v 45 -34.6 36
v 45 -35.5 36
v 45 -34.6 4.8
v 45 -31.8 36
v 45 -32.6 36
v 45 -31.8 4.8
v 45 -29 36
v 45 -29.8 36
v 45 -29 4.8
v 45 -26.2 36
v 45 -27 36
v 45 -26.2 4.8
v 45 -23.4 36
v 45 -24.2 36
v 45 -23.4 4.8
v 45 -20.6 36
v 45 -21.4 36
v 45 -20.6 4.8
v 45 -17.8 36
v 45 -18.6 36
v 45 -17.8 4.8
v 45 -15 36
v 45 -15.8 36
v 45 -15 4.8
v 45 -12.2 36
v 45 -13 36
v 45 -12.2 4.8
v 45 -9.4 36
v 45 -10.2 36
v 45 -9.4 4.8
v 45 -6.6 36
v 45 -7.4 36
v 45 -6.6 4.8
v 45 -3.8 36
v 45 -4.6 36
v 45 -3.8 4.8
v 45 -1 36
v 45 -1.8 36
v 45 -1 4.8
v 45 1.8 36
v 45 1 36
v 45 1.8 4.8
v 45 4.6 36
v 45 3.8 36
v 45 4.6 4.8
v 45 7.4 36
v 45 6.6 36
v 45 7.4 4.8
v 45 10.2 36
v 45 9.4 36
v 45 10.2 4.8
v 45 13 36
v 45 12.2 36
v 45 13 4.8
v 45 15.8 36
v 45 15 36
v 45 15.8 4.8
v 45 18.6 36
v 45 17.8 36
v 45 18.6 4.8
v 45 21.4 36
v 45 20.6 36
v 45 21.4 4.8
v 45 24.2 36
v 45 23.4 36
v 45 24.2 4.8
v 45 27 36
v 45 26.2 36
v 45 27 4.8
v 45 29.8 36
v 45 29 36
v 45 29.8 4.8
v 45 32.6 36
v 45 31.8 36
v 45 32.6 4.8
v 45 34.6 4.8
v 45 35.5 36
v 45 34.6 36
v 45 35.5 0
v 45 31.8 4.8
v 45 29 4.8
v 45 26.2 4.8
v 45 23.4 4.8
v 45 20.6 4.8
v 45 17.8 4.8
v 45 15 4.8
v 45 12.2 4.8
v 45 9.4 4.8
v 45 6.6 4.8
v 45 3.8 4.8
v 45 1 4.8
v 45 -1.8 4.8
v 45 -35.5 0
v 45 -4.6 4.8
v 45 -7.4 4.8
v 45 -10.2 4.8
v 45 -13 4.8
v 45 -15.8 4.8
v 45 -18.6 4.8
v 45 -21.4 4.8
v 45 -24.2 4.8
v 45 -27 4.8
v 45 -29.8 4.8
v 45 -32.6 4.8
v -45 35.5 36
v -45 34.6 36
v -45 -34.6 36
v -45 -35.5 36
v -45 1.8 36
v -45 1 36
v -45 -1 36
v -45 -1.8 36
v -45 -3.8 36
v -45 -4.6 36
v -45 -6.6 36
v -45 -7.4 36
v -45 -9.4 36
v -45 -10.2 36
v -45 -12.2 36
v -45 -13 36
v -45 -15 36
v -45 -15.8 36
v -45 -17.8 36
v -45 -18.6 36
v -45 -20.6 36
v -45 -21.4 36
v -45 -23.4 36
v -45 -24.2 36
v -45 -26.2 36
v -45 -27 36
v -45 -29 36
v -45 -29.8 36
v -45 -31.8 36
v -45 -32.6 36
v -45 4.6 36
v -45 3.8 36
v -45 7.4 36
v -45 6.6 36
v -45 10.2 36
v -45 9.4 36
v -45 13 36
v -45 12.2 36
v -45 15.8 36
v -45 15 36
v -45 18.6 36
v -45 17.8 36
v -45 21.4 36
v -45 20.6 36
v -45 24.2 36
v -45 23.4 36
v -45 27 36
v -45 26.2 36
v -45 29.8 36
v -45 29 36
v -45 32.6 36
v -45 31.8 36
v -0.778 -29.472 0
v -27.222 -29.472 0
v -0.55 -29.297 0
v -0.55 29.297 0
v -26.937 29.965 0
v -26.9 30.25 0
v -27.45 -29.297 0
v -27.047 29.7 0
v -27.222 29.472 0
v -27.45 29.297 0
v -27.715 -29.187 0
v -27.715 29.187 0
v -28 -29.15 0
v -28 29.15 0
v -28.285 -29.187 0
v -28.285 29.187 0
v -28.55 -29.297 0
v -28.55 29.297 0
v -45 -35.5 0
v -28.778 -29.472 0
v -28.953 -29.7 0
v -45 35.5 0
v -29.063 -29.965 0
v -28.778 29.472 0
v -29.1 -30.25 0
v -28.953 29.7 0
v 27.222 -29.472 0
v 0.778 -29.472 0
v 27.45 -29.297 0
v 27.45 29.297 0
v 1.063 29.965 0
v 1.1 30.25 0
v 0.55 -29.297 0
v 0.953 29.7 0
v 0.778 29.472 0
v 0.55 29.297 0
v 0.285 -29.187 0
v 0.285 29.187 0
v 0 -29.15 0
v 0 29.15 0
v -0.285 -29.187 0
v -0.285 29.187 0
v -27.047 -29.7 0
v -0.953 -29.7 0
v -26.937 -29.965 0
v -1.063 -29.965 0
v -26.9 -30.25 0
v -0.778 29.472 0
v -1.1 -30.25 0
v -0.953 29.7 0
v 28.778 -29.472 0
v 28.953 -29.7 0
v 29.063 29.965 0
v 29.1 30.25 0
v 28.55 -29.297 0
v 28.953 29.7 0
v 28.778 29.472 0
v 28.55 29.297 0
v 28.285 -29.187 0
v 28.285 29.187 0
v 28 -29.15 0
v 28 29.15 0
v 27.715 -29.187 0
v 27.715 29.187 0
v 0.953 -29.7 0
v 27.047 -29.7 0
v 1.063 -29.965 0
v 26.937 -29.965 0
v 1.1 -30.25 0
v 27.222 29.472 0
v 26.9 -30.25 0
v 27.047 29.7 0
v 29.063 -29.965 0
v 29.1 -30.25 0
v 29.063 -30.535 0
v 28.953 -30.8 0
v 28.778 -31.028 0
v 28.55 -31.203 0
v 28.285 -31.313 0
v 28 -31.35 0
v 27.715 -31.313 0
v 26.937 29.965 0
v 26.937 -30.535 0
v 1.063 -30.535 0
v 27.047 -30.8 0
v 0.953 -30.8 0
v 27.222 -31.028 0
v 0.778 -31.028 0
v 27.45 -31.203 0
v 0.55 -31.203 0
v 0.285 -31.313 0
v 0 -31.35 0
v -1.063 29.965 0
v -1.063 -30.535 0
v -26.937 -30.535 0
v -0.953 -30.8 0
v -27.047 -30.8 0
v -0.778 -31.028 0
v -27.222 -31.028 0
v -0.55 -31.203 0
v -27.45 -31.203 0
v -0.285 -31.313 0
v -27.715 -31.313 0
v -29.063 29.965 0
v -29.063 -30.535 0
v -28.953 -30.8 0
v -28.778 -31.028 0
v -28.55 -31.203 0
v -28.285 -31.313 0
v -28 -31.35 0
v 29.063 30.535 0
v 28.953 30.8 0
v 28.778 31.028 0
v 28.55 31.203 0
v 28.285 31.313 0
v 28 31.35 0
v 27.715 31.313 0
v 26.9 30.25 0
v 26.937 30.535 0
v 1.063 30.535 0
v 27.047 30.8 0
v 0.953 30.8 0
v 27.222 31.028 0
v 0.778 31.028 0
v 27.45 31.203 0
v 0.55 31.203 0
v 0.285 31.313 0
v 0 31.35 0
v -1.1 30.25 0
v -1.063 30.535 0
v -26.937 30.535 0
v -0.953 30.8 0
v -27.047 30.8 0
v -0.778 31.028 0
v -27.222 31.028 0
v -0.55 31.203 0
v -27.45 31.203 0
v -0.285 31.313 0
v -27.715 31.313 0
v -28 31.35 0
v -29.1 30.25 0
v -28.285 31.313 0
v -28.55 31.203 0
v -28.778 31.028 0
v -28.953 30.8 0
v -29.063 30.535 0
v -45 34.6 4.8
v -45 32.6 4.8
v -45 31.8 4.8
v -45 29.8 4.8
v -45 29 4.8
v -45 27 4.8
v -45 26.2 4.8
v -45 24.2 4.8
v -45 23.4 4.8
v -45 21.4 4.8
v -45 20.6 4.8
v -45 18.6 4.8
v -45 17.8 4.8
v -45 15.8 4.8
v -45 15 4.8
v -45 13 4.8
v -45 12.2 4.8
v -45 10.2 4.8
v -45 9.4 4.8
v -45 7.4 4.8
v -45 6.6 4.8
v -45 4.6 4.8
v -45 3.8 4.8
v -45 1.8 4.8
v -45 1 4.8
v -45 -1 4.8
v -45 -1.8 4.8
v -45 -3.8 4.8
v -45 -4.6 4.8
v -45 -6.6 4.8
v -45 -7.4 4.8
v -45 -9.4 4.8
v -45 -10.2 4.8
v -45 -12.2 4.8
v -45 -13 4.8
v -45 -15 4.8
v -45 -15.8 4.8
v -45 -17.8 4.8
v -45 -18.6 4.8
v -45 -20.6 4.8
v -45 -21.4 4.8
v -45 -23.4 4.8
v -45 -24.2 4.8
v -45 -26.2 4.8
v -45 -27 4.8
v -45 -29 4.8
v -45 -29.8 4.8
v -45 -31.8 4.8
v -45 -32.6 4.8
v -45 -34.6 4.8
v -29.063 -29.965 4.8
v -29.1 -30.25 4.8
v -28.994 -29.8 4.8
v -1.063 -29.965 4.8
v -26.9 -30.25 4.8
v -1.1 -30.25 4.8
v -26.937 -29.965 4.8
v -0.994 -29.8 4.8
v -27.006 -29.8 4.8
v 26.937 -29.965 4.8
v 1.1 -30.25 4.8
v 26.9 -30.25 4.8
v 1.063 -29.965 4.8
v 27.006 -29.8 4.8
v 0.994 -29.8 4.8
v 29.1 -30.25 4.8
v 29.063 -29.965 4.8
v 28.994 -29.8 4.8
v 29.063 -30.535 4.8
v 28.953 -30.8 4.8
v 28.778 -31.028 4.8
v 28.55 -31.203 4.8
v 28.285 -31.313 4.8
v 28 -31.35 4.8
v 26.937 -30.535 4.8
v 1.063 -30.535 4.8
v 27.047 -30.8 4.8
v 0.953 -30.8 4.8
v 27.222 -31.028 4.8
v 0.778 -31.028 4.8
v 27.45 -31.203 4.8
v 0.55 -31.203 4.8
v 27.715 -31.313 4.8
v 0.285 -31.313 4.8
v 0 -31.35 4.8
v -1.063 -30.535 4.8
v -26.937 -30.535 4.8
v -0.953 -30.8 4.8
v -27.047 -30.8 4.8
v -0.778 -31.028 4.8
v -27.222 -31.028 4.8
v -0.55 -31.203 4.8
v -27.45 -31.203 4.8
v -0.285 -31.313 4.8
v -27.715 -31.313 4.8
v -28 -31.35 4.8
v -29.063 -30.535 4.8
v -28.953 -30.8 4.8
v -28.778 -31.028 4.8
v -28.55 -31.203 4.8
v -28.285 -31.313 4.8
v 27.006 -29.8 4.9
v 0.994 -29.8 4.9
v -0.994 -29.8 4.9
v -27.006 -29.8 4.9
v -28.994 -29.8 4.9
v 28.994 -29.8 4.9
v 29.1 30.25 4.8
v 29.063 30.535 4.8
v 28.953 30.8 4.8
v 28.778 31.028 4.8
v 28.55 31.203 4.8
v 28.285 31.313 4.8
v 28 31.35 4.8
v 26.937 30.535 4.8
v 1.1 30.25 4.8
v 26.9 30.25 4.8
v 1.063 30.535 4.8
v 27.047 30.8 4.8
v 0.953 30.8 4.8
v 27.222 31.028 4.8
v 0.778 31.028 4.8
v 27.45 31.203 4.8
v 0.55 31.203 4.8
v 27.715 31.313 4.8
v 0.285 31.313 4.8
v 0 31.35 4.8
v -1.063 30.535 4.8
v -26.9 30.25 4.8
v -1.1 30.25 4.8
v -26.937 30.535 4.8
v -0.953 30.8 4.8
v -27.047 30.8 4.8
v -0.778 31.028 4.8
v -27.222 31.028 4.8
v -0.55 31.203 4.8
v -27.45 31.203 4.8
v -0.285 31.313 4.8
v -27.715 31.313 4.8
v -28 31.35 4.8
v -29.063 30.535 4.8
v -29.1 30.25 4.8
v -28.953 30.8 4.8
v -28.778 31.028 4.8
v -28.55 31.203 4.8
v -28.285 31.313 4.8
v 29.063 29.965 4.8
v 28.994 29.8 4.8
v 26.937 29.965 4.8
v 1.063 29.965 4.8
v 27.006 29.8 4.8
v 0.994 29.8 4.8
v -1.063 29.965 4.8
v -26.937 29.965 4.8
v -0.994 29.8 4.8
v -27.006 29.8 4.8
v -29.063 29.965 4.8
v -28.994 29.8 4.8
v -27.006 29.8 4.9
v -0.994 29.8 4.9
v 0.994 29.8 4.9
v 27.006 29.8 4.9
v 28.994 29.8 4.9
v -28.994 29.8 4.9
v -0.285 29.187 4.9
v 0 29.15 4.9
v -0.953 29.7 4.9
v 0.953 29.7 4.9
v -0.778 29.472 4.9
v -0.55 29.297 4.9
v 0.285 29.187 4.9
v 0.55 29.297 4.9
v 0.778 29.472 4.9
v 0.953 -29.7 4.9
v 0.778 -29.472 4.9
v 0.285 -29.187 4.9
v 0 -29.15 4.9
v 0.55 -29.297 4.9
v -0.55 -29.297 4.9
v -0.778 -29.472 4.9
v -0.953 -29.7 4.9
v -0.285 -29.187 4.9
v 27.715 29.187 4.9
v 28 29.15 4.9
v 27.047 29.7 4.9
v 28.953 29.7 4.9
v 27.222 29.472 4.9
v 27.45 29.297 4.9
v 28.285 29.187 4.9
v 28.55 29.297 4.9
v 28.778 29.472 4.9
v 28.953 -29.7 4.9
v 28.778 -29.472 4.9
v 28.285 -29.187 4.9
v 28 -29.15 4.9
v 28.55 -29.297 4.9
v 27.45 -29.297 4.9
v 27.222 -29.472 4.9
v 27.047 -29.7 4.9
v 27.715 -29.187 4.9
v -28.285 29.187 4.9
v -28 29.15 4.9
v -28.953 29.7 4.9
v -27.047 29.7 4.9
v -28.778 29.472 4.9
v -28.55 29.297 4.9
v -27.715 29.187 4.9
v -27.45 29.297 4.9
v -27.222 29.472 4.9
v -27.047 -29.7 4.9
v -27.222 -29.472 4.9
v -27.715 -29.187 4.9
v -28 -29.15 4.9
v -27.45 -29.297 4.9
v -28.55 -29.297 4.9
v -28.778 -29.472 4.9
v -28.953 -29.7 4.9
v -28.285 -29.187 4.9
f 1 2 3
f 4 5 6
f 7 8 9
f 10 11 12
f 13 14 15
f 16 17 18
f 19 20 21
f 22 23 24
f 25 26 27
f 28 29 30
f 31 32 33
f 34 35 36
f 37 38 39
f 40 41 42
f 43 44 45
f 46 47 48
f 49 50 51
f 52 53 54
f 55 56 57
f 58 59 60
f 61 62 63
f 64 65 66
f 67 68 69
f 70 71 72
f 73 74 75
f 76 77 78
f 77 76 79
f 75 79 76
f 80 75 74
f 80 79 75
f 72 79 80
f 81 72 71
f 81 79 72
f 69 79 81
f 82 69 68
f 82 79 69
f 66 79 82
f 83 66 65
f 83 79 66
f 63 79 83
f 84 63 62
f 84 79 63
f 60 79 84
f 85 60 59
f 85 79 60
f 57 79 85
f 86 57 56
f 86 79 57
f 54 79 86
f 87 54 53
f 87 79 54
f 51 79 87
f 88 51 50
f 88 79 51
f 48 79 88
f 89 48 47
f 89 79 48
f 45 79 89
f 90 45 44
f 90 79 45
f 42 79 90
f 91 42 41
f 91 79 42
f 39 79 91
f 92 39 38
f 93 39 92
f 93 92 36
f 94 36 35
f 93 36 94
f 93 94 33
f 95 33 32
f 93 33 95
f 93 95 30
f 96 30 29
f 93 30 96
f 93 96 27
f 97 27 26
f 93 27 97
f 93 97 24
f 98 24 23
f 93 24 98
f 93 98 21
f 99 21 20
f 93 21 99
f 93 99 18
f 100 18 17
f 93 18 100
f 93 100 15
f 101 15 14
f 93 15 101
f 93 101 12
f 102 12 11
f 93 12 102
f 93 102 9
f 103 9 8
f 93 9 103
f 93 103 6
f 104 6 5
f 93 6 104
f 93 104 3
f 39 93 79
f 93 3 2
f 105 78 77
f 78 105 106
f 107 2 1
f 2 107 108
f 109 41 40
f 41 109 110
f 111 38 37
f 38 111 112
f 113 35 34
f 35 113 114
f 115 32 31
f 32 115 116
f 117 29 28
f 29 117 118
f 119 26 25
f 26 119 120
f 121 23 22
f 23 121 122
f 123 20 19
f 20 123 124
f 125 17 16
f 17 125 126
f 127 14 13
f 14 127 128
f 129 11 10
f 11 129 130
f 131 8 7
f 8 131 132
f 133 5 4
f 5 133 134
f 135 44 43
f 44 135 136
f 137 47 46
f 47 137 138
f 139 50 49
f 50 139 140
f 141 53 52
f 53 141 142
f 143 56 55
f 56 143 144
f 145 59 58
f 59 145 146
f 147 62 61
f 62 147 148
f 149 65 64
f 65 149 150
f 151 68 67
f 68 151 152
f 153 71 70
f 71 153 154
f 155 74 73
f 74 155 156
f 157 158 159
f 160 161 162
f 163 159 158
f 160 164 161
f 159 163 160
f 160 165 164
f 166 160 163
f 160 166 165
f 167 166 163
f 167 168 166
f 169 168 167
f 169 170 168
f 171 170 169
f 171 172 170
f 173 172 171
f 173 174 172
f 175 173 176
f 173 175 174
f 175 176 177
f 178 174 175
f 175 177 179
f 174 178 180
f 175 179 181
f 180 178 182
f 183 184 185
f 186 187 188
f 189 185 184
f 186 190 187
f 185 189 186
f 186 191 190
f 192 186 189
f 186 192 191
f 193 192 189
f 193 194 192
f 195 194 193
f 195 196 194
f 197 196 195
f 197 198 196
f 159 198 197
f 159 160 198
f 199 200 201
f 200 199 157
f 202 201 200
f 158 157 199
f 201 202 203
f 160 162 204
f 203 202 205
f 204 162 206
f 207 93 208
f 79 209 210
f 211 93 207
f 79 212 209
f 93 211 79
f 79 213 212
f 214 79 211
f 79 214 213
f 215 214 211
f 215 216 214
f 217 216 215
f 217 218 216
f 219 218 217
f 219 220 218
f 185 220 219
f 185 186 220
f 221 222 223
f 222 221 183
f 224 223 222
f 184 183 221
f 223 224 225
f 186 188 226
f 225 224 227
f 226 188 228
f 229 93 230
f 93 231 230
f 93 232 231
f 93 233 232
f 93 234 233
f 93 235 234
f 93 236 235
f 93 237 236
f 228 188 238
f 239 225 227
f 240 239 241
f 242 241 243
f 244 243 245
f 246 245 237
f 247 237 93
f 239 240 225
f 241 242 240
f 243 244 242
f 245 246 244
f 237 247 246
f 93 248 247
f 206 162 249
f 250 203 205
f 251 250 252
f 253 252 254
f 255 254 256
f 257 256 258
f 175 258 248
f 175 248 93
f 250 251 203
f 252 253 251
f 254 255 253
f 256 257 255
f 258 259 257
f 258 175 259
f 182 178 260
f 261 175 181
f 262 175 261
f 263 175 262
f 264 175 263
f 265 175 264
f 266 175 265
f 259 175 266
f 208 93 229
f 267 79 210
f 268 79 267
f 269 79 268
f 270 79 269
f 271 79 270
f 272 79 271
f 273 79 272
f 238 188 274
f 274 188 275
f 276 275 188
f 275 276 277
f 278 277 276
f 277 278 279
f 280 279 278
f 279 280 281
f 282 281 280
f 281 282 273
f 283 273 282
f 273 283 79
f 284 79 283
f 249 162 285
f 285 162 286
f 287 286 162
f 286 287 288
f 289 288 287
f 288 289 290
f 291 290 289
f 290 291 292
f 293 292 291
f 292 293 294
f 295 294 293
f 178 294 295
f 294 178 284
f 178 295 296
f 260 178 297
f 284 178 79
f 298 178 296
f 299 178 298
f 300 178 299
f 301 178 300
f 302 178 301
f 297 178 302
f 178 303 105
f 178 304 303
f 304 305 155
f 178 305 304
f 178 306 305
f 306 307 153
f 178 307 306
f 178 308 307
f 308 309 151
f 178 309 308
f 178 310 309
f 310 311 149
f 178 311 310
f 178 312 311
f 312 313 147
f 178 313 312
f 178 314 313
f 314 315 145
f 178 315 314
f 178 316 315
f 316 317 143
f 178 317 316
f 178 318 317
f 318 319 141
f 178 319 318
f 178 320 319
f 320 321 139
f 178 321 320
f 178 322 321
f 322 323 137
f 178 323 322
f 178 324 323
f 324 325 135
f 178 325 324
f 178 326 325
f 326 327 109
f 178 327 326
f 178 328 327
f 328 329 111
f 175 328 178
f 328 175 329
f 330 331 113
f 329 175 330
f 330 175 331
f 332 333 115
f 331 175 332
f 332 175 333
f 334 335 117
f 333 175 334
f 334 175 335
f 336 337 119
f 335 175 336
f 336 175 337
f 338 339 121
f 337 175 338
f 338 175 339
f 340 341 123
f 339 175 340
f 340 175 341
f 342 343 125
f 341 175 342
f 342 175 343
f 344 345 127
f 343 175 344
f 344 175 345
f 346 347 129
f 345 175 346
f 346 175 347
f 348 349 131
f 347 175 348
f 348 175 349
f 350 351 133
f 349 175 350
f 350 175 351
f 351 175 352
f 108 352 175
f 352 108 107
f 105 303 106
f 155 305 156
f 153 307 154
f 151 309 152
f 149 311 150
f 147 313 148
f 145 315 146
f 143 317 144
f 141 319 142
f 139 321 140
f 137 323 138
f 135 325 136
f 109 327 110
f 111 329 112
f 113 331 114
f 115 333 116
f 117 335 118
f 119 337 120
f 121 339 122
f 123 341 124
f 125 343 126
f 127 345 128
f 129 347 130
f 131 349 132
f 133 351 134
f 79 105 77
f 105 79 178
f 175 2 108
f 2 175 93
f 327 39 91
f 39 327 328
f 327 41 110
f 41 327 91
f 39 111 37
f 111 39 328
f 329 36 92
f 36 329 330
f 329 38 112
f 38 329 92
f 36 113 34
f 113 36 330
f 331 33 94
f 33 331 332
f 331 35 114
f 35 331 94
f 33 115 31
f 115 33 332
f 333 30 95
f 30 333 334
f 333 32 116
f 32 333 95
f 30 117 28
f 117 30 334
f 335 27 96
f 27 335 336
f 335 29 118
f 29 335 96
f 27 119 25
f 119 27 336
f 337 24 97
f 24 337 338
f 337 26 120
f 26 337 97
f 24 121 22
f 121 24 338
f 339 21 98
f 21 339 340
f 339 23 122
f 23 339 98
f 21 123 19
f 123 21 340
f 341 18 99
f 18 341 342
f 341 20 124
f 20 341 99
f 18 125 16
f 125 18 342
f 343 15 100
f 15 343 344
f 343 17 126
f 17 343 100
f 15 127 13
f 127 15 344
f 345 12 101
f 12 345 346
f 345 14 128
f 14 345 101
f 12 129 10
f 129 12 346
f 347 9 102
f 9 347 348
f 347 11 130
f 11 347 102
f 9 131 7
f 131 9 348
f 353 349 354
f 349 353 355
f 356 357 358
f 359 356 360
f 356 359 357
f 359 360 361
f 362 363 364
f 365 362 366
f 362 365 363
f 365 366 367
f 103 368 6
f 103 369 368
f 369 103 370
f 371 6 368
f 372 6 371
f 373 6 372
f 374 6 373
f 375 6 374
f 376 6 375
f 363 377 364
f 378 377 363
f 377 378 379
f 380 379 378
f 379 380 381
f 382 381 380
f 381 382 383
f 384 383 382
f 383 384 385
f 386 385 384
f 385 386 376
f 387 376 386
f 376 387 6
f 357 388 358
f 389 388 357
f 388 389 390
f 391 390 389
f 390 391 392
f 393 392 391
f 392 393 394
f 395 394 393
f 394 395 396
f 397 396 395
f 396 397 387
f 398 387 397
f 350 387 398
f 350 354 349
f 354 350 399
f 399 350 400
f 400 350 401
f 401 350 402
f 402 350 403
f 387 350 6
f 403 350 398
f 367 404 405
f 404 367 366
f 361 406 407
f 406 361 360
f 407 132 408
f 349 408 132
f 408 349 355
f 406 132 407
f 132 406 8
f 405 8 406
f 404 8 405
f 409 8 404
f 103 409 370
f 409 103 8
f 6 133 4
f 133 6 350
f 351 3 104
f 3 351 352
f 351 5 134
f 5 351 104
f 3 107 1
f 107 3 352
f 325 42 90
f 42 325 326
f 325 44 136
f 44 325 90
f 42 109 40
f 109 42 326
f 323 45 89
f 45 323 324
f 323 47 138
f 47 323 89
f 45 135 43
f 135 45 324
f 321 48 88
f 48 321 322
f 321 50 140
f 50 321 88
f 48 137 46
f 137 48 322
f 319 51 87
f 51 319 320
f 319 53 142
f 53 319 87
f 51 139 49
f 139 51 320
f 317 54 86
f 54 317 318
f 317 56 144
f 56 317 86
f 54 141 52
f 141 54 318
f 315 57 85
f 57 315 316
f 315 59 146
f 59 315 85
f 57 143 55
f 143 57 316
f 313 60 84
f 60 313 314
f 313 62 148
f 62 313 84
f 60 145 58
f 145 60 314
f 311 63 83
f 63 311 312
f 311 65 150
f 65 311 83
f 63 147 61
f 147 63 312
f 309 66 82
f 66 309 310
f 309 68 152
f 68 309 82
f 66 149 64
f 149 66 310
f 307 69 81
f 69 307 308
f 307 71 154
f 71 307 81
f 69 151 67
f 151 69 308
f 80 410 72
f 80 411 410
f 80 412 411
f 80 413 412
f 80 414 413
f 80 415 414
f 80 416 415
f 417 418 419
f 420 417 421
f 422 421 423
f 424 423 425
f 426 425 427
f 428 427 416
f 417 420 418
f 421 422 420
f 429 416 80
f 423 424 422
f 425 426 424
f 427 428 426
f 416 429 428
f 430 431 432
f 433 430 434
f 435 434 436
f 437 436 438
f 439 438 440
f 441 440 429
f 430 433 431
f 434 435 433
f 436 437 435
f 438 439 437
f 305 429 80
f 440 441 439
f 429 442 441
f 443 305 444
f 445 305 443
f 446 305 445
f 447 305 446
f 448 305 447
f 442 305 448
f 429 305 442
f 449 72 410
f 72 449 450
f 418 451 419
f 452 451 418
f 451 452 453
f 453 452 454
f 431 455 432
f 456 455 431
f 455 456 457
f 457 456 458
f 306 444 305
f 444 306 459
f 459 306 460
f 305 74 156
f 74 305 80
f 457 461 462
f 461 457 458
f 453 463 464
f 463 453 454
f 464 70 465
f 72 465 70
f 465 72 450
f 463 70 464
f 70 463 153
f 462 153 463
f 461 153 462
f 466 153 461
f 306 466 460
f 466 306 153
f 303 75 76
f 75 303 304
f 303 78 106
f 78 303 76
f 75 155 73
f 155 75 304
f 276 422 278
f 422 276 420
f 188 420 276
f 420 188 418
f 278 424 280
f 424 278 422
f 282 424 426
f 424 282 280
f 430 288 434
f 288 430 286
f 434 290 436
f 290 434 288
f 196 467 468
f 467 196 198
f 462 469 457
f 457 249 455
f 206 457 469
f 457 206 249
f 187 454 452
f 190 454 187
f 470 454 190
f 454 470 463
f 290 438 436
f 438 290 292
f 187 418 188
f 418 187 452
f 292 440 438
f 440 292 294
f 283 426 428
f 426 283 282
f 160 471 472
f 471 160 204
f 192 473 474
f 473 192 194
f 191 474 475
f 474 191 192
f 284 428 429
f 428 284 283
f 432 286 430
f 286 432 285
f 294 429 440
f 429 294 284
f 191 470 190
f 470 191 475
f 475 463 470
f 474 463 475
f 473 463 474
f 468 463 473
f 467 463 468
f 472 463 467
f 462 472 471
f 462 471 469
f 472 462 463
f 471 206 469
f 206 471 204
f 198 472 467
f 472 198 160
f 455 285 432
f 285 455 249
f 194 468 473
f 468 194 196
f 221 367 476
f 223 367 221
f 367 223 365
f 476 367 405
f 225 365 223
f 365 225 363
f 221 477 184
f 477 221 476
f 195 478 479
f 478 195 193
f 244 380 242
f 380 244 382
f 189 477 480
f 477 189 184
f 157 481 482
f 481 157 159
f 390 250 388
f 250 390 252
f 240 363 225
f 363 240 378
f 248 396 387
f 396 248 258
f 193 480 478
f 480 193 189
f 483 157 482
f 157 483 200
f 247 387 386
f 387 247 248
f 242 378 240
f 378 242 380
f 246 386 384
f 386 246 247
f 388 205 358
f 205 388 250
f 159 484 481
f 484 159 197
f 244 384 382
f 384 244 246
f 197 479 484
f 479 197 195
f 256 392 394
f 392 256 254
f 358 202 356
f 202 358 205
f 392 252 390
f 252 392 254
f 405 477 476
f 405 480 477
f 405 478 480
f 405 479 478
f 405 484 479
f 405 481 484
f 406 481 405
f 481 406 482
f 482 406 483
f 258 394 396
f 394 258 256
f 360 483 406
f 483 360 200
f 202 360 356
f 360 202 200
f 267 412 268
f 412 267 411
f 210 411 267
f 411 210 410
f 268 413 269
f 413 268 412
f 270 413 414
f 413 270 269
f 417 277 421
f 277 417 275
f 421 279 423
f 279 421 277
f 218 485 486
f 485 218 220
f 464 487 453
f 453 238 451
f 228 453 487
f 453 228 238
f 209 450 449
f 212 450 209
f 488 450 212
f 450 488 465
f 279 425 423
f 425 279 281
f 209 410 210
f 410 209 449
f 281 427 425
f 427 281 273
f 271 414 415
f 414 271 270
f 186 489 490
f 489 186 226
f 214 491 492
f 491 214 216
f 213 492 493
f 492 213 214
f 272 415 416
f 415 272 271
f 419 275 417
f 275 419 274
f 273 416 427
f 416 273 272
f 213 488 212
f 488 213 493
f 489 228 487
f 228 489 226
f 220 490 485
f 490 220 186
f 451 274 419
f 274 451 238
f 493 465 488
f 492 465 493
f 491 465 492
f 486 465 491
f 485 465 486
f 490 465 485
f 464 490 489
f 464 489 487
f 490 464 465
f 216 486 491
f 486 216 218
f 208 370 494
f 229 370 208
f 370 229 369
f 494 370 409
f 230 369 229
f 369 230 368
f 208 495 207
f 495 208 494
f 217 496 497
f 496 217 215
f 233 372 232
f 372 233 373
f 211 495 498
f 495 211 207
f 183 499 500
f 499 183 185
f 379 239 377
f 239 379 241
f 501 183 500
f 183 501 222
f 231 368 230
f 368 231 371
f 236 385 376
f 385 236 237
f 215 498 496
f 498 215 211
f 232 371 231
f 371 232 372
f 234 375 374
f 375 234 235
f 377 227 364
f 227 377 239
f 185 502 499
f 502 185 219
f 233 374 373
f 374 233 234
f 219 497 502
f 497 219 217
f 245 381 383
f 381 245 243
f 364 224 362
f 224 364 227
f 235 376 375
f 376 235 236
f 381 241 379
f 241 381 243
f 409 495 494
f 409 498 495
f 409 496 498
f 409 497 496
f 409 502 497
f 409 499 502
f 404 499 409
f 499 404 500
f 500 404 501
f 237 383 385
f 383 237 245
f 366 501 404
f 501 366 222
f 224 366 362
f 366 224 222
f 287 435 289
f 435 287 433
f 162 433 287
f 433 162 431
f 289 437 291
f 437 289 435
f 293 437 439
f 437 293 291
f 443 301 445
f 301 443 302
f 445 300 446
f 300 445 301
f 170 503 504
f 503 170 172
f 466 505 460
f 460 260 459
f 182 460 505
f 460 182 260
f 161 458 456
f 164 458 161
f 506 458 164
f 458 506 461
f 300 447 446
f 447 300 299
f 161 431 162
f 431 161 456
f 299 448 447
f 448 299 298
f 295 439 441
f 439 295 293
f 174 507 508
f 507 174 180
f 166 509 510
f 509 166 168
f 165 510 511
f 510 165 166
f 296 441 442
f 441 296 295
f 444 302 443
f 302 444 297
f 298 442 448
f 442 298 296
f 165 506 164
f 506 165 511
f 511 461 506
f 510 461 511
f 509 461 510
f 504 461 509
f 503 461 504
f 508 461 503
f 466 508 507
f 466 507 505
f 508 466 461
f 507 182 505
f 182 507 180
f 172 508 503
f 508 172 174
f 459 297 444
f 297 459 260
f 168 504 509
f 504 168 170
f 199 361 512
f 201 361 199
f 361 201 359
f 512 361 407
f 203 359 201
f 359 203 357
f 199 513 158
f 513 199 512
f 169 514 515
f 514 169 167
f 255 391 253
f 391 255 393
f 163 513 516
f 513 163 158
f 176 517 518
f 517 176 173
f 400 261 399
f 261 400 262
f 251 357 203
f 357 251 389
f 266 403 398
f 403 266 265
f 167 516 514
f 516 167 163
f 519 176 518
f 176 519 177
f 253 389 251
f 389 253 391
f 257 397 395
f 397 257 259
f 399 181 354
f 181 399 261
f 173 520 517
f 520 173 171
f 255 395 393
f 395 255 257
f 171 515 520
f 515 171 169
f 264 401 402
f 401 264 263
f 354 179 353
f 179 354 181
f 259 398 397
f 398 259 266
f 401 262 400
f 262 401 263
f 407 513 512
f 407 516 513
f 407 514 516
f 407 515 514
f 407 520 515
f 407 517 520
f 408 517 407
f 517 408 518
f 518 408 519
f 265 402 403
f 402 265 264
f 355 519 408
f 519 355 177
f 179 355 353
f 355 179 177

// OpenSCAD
//BitAxeHex Heatsink

difference() {
  translate([-45,-35.5,0]) cube([90,71,36]);

  // Center cutout
  translate([-50,-1,4.8]) cube([100,2,50]);

  // minus Y cutouts
  translate([-50,-3.8,4.8]) cube([100,2,50]);
  translate([-50,-6.6,4.8]) cube([100,2,50]);
  translate([-50,-9.4,4.8]) cube([100,2,50]);
  translate([-50,-12.2,4.8]) cube([100,2,50]);
  translate([-50,-15.0,4.8]) cube([100,2,50]);
  translate([-50,-17.8,4.8]) cube([100,2,50]);
  translate([-50,-20.6,4.8]) cube([100,2,50]);
  translate([-50,-23.4,4.8]) cube([100,2,50]);
  translate([-50,-26.2,4.8]) cube([100,2,50]);
  translate([-50,-29.0,4.8]) cube([100,2,50]);
  translate([-50,-31.8,4.8]) cube([100,2,50]);
  translate([-50,-34.6,4.8]) cube([100,2,50]);

  // plus Y cutouts
  translate([-50,1.8,4.8]) cube([100,2,50]);
  translate([-50,4.6,4.8]) cube([100,2,50]);
  translate([-50,7.4,4.8]) cube([100,2,50]);
  translate([-50,10.2,4.8]) cube([100,2,50]);
  translate([-50,13.0,4.8]) cube([100,2,50]);
  translate([-50,15.8,4.8]) cube([100,2,50]);
  translate([-50,18.6,4.8]) cube([100,2,50]);
  translate([-50,21.4,4.8]) cube([100,2,50]);
  translate([-50,24.2,4.8]) cube([100,2,50]);
  translate([-50,27.0,4.8]) cube([100,2,50]);
  translate([-50,29.8,4.8]) cube([100,2,50]);
  translate([-50,32.6,4.8]) cube([100,2,50]);

  // mounting holes
  translate([0,30.25,-0.1]) cylinder(r=1.1, h=5, $fn=24);
  translate([0,-30.25,-0.1]) cylinder(r=1.1, h=5, $fn=24);
  translate([28,30.25,-0.1]) cylinder(r=1.1, h=5, $fn=24);
  translate([28,-30.25,-0.1]) cylinder(r=1.1, h=5, $fn=24);
  translate([-28,30.25,-0.1]) cylinder(r=1.1, h=5, $fn=24);
  translate([-28,-30.25,-0.1]) cylinder(r=1.1, h=5, $fn=24);
}
